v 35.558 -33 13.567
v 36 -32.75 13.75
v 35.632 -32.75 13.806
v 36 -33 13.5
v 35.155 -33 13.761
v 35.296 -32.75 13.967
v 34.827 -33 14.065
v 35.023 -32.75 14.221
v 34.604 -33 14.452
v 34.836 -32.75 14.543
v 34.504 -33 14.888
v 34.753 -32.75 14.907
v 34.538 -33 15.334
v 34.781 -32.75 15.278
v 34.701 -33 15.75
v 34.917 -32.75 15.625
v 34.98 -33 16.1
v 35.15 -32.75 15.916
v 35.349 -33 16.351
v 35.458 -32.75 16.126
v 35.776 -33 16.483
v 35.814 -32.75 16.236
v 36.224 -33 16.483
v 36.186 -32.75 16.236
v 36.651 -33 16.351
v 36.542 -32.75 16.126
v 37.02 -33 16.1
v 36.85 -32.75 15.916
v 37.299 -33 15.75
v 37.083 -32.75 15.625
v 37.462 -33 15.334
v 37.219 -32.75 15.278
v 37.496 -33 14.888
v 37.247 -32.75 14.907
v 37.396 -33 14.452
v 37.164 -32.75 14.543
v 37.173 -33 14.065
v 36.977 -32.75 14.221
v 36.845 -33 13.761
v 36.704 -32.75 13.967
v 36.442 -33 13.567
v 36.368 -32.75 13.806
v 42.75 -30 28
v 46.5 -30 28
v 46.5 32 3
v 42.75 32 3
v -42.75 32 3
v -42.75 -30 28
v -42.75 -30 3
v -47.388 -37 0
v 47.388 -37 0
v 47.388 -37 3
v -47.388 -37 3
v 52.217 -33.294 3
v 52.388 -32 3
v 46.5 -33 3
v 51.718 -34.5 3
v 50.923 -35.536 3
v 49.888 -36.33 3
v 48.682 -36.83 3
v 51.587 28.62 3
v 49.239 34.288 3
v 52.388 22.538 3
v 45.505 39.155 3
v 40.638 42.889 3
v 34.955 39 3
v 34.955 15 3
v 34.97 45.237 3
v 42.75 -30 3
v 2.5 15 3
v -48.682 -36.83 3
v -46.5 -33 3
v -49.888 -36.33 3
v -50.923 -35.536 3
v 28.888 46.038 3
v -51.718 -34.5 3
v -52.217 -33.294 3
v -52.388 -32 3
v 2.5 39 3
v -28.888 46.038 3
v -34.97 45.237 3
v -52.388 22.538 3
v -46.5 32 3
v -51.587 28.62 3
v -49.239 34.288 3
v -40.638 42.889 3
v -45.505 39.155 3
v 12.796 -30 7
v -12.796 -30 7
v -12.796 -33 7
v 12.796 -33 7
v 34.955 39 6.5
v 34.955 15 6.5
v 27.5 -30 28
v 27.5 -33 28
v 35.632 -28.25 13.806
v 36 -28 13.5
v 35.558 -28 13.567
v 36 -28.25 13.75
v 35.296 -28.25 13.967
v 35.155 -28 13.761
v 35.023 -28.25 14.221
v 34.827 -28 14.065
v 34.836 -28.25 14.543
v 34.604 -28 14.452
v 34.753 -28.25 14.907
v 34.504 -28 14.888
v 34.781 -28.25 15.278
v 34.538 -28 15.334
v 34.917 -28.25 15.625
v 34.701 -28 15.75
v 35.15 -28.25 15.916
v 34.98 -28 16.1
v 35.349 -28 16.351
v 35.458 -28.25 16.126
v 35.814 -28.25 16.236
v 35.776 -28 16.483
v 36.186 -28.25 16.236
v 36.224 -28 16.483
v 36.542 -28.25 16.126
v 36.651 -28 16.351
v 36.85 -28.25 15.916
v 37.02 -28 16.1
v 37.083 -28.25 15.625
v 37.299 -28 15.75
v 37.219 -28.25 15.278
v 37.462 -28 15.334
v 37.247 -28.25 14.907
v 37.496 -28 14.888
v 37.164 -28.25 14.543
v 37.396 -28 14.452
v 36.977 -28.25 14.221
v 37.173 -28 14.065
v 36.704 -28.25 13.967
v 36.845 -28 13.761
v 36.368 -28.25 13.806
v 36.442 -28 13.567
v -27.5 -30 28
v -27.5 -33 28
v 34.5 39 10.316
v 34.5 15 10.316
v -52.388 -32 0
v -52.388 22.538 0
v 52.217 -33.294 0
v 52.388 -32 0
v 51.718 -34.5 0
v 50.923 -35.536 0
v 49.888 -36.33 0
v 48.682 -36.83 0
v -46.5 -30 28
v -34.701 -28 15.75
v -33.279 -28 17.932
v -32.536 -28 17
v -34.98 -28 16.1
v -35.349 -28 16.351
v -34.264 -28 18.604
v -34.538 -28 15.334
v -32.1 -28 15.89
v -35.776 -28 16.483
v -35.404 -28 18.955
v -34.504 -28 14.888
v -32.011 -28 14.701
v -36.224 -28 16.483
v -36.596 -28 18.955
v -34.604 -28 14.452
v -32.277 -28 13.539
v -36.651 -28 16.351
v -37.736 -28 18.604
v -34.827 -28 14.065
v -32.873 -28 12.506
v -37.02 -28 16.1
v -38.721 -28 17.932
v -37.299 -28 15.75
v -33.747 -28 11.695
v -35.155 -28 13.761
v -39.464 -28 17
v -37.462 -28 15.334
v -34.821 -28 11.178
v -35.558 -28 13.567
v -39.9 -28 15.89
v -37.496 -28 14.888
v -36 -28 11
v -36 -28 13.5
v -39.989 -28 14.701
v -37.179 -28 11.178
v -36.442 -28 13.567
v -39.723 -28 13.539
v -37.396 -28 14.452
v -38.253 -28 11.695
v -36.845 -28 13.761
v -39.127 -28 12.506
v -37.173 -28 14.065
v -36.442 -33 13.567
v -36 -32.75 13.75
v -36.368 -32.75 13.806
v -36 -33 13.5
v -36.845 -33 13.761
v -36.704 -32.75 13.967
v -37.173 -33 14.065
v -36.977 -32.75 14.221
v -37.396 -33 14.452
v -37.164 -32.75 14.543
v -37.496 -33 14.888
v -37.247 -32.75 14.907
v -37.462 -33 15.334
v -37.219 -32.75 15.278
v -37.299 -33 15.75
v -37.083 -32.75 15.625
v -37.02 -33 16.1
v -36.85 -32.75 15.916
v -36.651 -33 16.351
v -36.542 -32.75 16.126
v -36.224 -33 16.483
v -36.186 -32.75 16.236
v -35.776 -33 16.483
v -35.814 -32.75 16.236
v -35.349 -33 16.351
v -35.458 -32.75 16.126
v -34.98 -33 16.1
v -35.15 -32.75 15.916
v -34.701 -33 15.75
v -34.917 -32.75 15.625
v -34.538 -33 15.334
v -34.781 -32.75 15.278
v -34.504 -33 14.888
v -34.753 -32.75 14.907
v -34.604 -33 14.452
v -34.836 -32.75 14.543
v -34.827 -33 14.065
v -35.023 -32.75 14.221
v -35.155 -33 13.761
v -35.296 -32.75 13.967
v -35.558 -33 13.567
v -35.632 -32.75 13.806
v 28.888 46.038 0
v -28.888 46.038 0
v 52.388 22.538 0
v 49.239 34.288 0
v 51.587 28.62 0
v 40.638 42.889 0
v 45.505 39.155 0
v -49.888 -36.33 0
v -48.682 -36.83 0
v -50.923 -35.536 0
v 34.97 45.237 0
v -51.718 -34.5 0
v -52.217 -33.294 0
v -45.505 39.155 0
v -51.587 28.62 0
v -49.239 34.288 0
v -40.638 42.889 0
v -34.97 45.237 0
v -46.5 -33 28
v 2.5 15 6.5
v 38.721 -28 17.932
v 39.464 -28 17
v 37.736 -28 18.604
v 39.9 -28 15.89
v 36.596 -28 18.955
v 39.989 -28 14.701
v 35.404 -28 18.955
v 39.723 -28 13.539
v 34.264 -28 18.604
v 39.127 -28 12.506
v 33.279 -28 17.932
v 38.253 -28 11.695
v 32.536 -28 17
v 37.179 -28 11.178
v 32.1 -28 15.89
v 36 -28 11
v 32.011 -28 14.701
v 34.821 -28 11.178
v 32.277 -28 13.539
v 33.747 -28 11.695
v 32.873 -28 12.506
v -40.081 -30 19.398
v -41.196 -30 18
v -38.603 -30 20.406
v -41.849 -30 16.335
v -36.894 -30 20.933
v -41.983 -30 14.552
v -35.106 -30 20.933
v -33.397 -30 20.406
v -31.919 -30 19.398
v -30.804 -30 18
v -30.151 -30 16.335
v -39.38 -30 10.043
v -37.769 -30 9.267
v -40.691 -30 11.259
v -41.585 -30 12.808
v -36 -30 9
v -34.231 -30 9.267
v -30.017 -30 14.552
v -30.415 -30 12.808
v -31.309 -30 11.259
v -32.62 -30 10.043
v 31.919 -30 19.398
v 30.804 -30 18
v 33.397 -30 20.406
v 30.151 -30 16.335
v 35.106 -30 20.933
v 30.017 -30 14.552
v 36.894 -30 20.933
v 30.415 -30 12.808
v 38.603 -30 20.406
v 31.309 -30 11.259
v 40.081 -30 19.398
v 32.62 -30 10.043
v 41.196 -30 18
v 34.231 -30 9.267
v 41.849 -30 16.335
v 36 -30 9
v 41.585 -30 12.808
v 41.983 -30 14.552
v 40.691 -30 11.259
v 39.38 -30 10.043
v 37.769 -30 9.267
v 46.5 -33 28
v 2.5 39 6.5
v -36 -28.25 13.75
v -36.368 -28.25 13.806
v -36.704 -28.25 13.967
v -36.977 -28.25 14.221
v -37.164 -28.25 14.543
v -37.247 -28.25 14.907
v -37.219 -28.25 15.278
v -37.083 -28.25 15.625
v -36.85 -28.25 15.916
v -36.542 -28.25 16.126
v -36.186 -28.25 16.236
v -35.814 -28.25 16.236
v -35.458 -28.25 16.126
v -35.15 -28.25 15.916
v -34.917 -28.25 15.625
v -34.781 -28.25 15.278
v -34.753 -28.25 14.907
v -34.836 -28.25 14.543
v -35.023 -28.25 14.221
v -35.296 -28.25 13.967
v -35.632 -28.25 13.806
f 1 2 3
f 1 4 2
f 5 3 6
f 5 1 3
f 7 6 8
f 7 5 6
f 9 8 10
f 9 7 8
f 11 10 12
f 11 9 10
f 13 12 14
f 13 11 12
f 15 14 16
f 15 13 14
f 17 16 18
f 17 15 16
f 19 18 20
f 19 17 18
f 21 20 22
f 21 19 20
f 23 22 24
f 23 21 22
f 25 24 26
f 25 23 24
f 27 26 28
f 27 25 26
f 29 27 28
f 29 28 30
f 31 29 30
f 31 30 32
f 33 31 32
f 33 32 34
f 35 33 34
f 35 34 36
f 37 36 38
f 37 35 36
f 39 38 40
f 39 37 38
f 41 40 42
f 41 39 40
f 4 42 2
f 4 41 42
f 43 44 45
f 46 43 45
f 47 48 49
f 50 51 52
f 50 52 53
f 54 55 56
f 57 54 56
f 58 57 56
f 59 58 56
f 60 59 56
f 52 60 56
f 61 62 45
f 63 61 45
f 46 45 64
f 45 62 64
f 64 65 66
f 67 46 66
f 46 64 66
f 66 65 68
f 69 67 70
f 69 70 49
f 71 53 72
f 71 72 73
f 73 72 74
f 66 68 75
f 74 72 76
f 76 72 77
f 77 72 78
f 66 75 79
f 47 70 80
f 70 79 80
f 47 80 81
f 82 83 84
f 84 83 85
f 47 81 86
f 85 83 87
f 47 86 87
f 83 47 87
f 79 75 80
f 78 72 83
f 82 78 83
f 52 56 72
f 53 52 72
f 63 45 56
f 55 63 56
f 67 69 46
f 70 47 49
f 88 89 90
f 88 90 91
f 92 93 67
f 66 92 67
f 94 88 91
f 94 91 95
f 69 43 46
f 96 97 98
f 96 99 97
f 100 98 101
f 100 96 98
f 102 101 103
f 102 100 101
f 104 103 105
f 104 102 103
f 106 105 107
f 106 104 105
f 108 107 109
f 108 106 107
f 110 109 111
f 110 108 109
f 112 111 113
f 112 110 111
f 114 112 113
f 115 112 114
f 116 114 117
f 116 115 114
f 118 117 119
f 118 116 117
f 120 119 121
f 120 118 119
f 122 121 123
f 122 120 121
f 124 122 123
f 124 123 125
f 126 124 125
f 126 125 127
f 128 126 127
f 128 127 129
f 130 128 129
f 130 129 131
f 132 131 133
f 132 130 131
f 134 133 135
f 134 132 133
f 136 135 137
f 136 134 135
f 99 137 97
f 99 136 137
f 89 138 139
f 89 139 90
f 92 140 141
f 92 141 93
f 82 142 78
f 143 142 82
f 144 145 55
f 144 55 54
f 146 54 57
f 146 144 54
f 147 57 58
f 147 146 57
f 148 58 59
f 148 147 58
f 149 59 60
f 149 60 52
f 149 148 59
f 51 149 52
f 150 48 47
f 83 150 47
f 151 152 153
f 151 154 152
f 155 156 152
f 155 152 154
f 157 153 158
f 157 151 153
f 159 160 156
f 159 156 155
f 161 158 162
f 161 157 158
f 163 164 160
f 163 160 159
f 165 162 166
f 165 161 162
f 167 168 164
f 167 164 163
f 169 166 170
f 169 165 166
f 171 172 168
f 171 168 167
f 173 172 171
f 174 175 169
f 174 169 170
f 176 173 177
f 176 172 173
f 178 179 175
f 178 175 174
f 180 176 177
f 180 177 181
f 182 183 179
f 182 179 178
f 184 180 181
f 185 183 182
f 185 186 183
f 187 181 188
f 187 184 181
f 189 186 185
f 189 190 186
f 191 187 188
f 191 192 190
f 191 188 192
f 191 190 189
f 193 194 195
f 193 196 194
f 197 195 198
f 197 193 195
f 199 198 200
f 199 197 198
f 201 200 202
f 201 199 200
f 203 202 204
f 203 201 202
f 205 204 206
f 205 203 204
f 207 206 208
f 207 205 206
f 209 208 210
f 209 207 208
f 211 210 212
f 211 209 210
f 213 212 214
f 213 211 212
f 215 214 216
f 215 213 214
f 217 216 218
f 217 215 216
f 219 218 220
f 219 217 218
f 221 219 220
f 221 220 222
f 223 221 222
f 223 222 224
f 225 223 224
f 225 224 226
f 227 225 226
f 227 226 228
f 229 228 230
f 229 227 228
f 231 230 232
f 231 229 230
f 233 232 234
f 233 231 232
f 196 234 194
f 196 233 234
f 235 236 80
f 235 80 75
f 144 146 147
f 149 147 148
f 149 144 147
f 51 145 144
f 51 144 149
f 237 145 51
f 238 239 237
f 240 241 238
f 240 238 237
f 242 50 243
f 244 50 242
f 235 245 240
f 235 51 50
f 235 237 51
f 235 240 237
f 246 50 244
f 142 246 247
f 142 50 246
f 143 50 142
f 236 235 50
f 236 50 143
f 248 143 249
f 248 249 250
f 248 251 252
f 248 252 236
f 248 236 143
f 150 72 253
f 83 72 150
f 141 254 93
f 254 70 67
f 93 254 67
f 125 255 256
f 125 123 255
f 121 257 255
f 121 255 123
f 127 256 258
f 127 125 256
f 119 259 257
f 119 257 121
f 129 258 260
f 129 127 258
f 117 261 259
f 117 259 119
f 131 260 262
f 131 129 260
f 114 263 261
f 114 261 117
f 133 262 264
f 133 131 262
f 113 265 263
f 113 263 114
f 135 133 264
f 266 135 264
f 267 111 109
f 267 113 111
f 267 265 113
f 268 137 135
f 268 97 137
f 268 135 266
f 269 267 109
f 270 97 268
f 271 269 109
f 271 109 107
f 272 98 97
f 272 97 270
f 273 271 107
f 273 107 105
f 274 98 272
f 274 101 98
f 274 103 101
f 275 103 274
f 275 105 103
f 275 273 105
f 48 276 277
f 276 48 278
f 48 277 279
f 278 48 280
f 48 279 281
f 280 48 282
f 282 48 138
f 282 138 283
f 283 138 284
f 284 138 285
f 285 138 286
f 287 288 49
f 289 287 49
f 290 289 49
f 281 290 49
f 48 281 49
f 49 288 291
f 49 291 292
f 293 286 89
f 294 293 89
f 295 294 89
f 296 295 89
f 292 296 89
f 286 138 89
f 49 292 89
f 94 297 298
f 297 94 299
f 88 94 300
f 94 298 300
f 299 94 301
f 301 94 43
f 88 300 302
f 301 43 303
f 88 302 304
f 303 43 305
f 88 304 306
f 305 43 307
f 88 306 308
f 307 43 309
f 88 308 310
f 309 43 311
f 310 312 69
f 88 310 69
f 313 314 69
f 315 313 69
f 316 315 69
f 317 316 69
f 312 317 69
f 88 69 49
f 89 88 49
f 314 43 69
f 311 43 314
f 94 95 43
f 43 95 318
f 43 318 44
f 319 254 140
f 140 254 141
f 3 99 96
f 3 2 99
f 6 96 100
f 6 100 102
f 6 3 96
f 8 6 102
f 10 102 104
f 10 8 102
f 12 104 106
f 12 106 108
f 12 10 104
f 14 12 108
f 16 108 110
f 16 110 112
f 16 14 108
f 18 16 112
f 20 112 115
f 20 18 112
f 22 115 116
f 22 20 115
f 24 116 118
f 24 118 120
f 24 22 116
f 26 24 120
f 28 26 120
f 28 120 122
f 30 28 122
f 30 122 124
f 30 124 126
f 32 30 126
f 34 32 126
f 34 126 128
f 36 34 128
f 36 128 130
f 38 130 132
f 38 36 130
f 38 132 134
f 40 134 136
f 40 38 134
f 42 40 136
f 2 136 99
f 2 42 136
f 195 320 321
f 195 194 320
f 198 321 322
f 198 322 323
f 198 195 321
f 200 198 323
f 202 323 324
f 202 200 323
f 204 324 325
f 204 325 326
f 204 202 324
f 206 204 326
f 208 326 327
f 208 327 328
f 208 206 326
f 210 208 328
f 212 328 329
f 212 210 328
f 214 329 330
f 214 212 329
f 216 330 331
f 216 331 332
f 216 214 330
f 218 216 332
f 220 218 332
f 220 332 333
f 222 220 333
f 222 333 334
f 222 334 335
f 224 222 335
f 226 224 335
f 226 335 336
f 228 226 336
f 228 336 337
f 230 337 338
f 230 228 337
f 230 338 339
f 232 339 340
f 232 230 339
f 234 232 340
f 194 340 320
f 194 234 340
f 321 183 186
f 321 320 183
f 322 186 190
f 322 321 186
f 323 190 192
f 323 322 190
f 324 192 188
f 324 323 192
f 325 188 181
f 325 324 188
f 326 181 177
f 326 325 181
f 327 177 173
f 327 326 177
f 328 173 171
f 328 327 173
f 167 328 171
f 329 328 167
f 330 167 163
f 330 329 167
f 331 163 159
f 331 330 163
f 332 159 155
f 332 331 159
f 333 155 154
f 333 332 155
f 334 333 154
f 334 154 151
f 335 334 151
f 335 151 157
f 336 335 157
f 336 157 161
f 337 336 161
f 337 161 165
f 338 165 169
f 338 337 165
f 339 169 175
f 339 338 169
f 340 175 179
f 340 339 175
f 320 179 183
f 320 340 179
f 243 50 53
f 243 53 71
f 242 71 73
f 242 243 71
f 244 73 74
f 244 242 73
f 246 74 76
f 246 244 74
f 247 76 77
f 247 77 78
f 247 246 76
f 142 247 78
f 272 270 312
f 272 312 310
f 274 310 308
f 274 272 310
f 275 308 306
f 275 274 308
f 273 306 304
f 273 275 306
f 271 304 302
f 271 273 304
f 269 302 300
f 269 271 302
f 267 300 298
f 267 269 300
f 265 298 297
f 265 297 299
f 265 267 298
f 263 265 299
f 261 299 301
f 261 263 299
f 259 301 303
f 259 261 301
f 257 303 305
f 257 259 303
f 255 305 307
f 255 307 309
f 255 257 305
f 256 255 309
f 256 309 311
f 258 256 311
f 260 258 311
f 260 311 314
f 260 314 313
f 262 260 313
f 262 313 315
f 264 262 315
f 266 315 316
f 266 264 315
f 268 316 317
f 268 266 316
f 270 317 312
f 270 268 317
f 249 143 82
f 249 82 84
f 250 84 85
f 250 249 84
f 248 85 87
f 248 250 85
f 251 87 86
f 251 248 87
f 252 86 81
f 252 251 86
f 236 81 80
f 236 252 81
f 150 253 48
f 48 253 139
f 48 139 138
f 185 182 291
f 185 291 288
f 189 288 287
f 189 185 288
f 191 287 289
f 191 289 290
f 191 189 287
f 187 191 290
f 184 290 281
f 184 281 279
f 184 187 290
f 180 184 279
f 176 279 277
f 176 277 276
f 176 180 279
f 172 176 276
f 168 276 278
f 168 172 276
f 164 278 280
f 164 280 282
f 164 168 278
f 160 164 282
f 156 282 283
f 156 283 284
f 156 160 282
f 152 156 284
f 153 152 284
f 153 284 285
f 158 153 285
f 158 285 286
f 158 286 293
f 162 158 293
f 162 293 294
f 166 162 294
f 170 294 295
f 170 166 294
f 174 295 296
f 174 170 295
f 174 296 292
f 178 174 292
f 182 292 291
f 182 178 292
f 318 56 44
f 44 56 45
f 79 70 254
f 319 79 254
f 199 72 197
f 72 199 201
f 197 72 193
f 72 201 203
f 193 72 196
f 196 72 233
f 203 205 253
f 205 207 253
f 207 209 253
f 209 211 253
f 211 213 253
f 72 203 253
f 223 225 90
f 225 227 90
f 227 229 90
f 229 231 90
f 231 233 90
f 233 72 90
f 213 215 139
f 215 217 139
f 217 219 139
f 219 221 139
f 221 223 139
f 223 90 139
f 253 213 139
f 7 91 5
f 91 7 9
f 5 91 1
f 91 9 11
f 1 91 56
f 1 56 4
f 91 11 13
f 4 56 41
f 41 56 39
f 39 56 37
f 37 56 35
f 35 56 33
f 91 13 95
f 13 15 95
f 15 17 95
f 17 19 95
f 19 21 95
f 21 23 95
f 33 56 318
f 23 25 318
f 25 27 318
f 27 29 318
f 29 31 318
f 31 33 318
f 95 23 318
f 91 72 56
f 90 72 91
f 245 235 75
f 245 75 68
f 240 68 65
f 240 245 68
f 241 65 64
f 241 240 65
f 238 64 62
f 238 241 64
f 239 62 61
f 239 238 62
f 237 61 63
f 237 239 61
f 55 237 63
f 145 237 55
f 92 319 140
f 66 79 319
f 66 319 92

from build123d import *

# Parameters (mm, degrees)
PLATE_DEPTH               = 3
BRACKET_DEPTH             = 46.5
BRACKET_HOLLOW_DEPTH      = 42.75
SKETCH29_R                = 4
INSERT_BOSS_DEPTH         = 2
INSERT_CHAMFER_SIZE       = 2
M3_MOUNT_HOLES_AT_2_COUNT = 2
M3_MOUNT_HOLES_AT_2_PITCH = 72
CUT_EXTRUDE1_DEPTH        = 97.489126654
TOP_CAM_BOSS_START        = 15
TOP_CAM_BOSS_DEPTH        = 24


with BuildPart() as part:
    # Sketch1 → plate (new body)
    with BuildSketch(Plane.XY):
        with BuildLine():
            Line((-28.8875, 46.0375), (28.8875, 46.0375))
            ThreePointArc((28.8875, 46.0375), (45.504509358, 39.154509358), (52.3875, 22.5375))
            Line((52.3875, 22.5375), (52.3875, 0))
            Line((52.3875, 0), (52.3875, -32))
            ThreePointArc((52.3875, -32), (50.923033906, -35.535533906), (47.3875, -37))
            Line((47.3875, -37), (-47.3875, -37))
            ThreePointArc((-47.3875, -37), (-50.923033906, -35.535533906), (-52.3875, -32))
            Line((-52.3875, -32), (-52.3875, 0))
            Line((-52.3875, 0), (-52.3875, 22.5375))
            ThreePointArc((-52.3875, 22.5375), (-45.504509358, 39.154509358), (-28.8875, 46.0375))
        make_face()
    extrude(amount=PLATE_DEPTH)

    # Sketch9 → bracket (add, symmetric)
    with BuildSketch(Plane(origin=(0, 0, 0), x_dir=(0, 0, -1), z_dir=(1, 0, 0))):
        Polygon((-3, 32), (-3, -33), (-28, -33), (-28, -30), align=None)
    extrude(amount=BRACKET_DEPTH, both=True)

    # Sketch10 → bracket hollow (cut, symmetric)
    with BuildSketch(Plane(origin=(0, 0, 0), x_dir=(0, 0, -1), z_dir=(1, 0, 0))):
        Polygon((-28, -30), (-3, -30), (-3, 32), align=None)
    extrude(amount=BRACKET_HOLLOW_DEPTH, both=True, mode=Mode.SUBTRACT)

    # Sketch29 → insert boss (add)
    with BuildSketch(Plane(origin=(0, -30, 0), x_dir=(1, 0, 0), z_dir=(0, 1, 0))):
        with Locations(Location((36, -15, 0), (0, 0, 90))):
            Circle(SKETCH29_R)
        with Locations(Location((-36, -15, 0), (0, 0, 90))):
            Circle(SKETCH29_R)
    extrude(amount=INSERT_BOSS_DEPTH)

    # insert chamfer
    insert_chamfer_edges = [part.edges().sort_by_distance(p)[0] for p in [
        (36, -30, 19),
        (-36, -30, 19),
    ]]
    chamfer(insert_chamfer_edges, length=INSERT_CHAMFER_SIZE - 0.0001)  # a hair under: the kernel refuses the full size

    # Sketch12 → M3 mount holes (revolve, cut)
    with BuildSketch(Plane(origin=(36, -33, 15), x_dir=(0, 0, -1), z_dir=(1, 0, 0))):
        Polygon((0, 0), (0, 5), (1.5, 5), (1.25, 4.75), (1.25, 0.25), (1.5, 0), align=None)
    m3_mount_holes = revolve(axis=Axis((36, -39.35, 15), (0, 1, 0)), mode=Mode.SUBTRACT)

    # M3 mount holes at 2: M3 mount holes ×2
    with Locations(*[(-i * M3_MOUNT_HOLES_AT_2_PITCH, 0, 0) for i in range(1, M3_MOUNT_HOLES_AT_2_COUNT)]):
        add(m3_mount_holes, mode=Mode.SUBTRACT)

    # Sketch30 → Cut-Extrude1 (cut, through all)
    with BuildSketch(Plane(origin=(0, -30, 0), x_dir=(1, 0, 0), z_dir=(0, 1, 0))):
        Polygon((-27.5, -28), (-12.795641698, -7), (12.795641698, -7), (27.5, -28), align=None)
    extrude(amount=-CUT_EXTRUDE1_DEPTH, mode=Mode.SUBTRACT)

    # Sketch5 → top-cam-boss (add)
    with BuildSketch(Plane(origin=(0, 0, 0), x_dir=(1, 0, 0), z_dir=(0, 1, 0)).offset(TOP_CAM_BOSS_START)):
        Polygon((2.5, -6.5), (34.5, -10.315768982), (34.955002904, -6.5), (34.955002904, -3), (2.5, -3), align=None)
    extrude(amount=TOP_CAM_BOSS_DEPTH)


solid = part.part
